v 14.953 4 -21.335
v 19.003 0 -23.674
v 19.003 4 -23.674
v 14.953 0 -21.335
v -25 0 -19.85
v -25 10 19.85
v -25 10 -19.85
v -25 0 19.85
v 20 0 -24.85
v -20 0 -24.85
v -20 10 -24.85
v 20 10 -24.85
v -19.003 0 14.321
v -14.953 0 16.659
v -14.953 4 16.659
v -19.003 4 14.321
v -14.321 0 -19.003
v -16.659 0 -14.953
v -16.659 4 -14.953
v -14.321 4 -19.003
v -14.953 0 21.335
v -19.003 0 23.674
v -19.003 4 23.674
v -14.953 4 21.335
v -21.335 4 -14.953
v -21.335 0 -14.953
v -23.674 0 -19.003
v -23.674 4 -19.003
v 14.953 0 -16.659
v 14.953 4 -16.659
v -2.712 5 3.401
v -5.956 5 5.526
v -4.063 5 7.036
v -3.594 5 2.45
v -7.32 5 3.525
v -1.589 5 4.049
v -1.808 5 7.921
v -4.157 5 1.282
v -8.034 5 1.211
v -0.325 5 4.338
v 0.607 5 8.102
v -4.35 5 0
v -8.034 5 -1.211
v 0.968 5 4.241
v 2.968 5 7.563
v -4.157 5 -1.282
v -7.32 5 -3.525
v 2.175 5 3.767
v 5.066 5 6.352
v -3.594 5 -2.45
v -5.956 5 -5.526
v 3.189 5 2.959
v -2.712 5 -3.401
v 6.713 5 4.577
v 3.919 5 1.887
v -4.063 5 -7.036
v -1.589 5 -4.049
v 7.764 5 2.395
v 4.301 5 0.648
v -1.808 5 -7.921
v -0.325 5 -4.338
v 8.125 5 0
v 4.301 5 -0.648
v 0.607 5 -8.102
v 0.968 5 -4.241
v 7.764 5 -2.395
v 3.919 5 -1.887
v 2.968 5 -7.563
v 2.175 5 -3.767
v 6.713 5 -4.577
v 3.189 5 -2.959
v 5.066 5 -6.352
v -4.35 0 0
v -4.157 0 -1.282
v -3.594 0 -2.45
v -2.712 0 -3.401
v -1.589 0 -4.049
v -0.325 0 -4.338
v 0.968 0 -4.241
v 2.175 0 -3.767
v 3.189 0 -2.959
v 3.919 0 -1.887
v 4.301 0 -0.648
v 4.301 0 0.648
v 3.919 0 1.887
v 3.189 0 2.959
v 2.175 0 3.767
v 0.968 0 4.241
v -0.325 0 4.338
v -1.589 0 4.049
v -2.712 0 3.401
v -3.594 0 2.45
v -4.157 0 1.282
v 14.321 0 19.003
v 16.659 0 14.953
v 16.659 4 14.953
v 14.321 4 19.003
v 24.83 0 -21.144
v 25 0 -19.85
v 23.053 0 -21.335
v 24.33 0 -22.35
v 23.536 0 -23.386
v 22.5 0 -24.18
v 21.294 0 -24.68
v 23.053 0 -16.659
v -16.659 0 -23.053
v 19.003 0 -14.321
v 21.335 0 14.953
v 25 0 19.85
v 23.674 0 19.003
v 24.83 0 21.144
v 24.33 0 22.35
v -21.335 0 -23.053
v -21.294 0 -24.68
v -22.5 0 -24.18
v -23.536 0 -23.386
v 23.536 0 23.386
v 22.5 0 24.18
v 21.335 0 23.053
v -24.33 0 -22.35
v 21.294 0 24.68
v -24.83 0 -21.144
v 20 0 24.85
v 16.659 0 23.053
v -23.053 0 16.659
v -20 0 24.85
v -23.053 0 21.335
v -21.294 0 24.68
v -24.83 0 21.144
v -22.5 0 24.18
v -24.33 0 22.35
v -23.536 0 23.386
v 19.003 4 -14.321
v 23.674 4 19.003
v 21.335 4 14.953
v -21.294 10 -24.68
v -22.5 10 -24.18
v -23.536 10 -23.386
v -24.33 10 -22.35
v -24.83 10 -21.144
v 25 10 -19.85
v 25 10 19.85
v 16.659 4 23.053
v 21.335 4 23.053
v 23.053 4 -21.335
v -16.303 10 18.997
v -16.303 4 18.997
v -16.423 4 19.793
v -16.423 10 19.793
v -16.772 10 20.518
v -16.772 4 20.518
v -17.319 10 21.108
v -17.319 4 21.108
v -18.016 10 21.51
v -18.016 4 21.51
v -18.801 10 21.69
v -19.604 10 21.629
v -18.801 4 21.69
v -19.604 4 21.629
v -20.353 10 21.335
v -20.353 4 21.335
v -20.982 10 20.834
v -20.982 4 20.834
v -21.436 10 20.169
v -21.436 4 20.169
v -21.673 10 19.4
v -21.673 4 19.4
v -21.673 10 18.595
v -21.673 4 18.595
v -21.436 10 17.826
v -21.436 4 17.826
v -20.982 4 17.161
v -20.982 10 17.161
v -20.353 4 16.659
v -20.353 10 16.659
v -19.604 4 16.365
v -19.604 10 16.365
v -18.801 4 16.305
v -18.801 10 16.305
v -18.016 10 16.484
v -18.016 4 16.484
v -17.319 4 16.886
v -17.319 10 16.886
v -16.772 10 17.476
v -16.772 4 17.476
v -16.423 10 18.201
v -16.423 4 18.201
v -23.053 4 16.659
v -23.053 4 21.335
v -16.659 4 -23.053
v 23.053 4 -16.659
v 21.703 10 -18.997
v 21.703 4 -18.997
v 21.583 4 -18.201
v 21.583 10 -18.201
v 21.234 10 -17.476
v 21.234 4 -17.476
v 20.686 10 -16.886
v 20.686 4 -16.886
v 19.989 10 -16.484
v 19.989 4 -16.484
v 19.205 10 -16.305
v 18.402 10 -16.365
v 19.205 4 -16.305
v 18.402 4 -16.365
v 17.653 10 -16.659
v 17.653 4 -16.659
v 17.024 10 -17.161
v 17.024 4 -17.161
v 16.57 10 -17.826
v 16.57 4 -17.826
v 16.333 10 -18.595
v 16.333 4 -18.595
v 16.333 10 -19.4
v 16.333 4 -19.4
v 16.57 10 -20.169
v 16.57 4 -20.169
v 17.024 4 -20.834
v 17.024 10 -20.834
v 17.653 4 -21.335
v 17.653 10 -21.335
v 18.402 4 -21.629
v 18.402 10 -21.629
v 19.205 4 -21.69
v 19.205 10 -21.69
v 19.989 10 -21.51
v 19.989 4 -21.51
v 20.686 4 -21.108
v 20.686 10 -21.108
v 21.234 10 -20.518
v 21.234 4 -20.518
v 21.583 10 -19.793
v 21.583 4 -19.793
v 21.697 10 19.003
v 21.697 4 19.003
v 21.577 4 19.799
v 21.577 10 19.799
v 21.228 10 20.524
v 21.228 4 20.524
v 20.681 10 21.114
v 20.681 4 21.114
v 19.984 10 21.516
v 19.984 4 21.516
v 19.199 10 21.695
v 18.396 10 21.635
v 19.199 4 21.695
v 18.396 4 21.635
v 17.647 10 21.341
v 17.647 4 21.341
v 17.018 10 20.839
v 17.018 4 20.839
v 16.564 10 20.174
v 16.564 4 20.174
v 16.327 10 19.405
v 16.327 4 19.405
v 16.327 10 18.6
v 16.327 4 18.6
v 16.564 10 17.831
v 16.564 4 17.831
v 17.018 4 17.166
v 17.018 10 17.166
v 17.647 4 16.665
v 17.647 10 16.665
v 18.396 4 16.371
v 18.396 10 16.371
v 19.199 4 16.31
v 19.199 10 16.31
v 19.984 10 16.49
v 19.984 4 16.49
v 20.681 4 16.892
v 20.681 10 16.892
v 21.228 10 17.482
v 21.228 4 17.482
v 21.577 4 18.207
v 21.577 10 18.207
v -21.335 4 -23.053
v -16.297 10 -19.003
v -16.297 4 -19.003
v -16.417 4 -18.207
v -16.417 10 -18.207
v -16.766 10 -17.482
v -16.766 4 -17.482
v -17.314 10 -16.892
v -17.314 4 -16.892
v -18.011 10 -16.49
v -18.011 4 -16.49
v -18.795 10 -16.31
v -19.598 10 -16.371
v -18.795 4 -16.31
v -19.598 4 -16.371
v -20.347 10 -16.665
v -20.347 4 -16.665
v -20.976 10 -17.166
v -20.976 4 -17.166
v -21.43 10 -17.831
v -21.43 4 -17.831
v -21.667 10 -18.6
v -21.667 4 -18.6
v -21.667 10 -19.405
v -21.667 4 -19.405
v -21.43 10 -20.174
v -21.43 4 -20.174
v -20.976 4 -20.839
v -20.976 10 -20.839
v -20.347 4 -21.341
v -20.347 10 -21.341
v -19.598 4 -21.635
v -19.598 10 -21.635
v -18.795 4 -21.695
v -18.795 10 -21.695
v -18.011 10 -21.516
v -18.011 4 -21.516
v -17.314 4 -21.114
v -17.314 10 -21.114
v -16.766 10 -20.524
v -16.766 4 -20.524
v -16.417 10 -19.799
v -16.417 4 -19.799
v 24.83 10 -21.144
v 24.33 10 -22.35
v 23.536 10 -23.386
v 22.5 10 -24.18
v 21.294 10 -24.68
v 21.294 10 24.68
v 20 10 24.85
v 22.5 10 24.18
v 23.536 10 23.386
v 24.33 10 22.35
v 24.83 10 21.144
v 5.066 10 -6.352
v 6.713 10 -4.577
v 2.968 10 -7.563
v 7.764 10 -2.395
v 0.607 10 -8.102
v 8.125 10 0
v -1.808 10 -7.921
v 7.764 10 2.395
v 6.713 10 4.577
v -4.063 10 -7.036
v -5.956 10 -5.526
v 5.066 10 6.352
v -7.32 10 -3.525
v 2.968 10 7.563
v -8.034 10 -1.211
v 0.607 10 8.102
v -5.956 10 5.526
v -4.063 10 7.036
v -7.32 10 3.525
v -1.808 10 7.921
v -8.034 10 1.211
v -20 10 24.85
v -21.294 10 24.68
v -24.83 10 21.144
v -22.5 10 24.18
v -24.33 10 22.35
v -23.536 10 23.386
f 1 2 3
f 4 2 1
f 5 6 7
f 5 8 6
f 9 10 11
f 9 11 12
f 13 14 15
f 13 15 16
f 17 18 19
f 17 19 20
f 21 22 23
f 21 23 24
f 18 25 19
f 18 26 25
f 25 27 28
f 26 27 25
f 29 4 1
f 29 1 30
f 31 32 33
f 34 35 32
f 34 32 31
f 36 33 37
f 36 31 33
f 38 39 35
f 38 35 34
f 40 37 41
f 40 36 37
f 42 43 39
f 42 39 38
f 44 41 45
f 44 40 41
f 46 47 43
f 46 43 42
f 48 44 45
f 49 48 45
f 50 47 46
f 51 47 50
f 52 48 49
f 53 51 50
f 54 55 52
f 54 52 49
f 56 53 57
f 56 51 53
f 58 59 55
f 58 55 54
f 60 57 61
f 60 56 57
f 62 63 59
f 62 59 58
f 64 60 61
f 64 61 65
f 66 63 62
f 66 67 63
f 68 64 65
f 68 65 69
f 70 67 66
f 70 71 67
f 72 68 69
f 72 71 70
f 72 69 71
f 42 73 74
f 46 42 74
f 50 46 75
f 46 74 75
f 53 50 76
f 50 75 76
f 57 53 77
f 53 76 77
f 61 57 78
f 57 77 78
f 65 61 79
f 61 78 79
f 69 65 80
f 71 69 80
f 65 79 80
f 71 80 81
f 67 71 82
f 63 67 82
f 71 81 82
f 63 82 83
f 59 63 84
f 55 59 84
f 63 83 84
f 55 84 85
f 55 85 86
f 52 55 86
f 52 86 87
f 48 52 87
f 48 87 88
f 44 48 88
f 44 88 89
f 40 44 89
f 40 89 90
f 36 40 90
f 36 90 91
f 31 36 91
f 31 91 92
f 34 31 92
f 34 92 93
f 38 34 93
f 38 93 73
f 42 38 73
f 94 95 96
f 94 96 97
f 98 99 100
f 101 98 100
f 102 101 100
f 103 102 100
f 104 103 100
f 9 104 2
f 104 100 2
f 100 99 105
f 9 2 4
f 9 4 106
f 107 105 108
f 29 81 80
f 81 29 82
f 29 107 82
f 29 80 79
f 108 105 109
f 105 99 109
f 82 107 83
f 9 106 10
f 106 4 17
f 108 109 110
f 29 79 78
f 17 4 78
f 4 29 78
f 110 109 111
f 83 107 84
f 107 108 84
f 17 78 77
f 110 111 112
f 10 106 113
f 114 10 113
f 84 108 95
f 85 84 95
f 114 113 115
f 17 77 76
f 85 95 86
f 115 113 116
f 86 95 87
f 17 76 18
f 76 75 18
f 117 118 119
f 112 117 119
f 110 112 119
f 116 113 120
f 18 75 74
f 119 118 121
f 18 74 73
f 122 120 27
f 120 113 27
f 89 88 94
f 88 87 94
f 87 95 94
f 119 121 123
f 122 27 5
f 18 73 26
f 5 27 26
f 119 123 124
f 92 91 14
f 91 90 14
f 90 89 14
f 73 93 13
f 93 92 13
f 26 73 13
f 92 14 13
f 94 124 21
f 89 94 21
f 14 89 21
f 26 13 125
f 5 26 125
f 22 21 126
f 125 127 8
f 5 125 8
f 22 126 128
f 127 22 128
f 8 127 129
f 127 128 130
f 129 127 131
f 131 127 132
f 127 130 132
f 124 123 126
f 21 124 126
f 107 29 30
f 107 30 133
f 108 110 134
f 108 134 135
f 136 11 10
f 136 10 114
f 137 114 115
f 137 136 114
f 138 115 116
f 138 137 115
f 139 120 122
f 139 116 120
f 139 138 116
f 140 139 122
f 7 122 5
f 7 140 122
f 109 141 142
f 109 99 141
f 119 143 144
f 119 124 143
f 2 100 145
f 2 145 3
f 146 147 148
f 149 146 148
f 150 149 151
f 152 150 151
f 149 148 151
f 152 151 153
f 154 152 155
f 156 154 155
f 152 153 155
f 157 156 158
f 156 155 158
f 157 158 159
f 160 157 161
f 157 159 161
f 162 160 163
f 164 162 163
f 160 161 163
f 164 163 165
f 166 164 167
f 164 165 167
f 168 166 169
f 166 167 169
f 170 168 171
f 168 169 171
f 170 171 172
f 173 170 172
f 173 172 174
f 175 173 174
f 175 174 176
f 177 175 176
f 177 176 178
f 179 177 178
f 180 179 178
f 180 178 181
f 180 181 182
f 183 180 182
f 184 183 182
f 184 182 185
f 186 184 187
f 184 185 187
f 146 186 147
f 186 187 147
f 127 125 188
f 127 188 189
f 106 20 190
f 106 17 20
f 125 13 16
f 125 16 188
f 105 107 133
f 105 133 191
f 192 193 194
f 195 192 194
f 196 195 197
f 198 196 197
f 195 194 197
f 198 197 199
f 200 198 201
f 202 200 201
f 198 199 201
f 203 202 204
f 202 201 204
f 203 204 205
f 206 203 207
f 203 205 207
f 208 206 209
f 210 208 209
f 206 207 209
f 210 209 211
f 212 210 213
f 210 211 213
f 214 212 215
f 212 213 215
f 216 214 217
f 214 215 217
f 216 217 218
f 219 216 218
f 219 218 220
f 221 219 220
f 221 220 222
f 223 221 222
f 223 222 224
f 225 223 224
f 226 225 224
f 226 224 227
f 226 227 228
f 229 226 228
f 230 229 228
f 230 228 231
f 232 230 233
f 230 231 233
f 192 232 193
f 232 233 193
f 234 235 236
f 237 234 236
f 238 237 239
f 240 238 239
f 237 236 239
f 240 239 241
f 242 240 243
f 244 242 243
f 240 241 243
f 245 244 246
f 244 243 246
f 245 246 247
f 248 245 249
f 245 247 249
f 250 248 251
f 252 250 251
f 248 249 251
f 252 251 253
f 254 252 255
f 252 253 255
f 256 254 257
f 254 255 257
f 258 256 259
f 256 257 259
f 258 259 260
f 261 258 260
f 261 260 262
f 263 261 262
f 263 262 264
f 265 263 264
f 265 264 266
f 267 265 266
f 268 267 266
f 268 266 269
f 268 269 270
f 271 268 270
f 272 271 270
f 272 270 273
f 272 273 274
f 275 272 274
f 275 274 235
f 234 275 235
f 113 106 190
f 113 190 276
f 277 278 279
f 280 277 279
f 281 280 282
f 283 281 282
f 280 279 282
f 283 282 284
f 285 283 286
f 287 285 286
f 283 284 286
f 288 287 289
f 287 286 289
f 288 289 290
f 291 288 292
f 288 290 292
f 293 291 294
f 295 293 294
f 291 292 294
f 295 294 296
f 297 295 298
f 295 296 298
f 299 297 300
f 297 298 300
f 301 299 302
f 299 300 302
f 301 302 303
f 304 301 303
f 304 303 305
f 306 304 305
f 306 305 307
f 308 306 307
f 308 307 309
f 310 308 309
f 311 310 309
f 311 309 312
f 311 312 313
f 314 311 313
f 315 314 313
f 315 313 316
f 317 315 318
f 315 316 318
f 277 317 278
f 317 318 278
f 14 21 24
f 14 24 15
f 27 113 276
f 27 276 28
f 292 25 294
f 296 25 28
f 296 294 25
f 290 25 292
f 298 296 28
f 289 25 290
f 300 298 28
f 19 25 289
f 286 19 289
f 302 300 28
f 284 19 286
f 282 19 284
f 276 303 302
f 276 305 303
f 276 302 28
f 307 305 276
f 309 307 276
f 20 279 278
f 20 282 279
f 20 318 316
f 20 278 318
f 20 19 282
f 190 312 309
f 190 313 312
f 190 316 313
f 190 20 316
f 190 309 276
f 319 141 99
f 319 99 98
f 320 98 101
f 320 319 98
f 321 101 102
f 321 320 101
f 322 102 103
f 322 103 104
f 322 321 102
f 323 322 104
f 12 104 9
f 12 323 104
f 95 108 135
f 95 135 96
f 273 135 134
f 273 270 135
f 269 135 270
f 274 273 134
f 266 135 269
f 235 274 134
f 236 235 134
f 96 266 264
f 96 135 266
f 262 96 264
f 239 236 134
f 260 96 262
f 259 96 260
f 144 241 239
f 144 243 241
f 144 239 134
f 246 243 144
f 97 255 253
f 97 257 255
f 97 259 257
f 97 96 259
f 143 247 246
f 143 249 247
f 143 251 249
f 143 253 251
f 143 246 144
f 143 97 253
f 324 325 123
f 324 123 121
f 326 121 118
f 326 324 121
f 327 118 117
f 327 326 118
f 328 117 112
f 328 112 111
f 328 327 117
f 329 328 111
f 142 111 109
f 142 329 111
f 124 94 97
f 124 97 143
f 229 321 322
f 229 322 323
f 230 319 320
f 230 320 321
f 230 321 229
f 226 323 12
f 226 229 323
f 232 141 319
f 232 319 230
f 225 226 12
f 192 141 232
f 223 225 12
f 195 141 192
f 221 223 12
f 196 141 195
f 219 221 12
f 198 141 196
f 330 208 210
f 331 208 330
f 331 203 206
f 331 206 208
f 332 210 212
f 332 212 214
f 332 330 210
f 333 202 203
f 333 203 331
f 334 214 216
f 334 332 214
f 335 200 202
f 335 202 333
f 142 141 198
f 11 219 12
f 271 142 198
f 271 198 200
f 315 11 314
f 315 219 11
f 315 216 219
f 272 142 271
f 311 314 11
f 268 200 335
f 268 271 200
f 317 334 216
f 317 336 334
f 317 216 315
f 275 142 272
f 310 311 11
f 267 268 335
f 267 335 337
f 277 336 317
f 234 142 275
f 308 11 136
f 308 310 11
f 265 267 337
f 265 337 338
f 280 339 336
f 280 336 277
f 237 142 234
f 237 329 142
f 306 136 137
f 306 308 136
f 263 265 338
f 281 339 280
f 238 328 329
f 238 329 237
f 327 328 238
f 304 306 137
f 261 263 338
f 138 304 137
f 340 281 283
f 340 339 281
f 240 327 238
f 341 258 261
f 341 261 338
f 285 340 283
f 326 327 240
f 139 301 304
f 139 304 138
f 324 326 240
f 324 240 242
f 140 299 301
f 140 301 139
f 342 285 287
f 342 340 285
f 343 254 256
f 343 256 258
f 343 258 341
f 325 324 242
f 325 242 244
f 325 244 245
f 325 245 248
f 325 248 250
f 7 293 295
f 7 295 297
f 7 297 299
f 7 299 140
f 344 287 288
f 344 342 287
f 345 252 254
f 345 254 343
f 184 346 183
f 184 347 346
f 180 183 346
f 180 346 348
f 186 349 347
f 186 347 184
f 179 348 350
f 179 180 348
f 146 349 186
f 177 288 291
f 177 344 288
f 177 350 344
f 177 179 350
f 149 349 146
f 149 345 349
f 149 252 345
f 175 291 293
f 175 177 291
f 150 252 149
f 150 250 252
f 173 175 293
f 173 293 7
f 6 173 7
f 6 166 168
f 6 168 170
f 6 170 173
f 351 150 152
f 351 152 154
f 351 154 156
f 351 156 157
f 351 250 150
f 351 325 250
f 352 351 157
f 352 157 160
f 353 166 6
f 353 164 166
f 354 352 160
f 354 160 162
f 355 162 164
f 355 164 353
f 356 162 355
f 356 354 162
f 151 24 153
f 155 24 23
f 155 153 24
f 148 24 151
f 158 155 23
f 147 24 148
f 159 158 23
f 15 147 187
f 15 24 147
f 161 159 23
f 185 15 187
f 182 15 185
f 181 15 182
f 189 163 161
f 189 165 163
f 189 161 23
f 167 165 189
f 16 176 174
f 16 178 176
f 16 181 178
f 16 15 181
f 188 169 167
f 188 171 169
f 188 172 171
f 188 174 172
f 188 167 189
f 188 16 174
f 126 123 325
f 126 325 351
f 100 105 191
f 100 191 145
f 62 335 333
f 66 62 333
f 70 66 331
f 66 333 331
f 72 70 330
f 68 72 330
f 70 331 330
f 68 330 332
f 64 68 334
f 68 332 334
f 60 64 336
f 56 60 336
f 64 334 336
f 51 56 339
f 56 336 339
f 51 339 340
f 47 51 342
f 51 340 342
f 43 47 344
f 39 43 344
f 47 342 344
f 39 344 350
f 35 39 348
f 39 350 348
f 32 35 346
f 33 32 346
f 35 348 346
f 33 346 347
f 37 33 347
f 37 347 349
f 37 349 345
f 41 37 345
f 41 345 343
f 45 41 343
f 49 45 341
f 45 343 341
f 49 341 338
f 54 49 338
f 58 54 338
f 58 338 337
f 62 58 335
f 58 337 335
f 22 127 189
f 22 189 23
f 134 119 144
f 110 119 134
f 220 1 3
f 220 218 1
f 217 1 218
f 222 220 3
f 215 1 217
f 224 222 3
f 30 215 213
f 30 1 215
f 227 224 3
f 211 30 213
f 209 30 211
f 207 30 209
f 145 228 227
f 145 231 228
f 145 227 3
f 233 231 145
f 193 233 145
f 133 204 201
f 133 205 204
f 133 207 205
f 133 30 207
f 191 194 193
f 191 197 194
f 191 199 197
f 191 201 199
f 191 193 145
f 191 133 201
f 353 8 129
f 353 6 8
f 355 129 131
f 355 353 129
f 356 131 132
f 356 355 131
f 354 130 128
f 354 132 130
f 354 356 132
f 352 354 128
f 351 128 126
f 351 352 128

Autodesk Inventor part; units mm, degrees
ref_plane "YZ Plane" through (0, 0, 0) normal (1, 0, 0) x (0, 1, 0)
ref_plane "XZ Plane" through (0, 0, 0) normal (0, 1, 0) x (-1, 0, 0)
ref_plane "XY Plane" through (0, 0, 0) normal (0, 0, 1) x (1, 0, 0)
sketch "Boceto1" plane through (0, 0, 0) normal (0, 1, 0) x (-1, 0, 0)
  line L0 (-25, 24.85) -> (25, 24.85)
  line L1 (25, 24.85) -> (25, -24.85)
  line L2 (25, -24.85) -> (-25, -24.85)
  line L3 (-25, -24.85) -> (-25, 24.85)
  line L4 (-25, 24.85) -> (25, -24.85) construction
  line L5 (25, 24.85) -> (-25, -24.85) construction
  circle A0 centre (0, 0) radius 4.35
  dimension "d0" = 50
  dimension "d1" = 8.7
  dimension "d2" = 49.7
extrude "Extrusión1" add sketch "Boceto1" along normal blind 10
sketch "Boceto4" plane through (0, 0, 0) normal (0, -1, 0) x (1, 0, 0)
  line L0 (25, 24.85) -> (25, -24.85) projected
  line L1 (-25, -24.85) -> (-25, 24.85) projected
  line L2 (25, 24.85) -> (-25, 24.85)
  line L3 (-25, 24.85) -> (-25, 17.85)
  line L4 (-25, 17.85) -> (25, 17.85)
  line L5 (25, 17.85) -> (25, 24.85)
  line L6 (25, -24.85) -> (-25, -24.85) projected
  line L7 (25, -24.85) -> (-25, -24.85)
  line L8 (-25, -24.85) -> (-25, -17.85)
  line L9 (-25, -17.85) -> (25, -17.85)
  line L10 (25, -17.85) -> (25, -24.85)
  line L11 (25, -24.85) -> (-25, -24.85) projected
  line L12 (25, 24.85) -> (25, -24.85) projected
  line L13 (-25, 24.85) -> (25, 24.85) projected
  line L14 (-25, -24.85) -> (-25, 24.85) projected
  circle A0 centre (0, 0) radius 4.35 projected
  point P0 (-25, -17.85)
  point P1 (25, -17.85)
  point P2 (-25, 24.85)
  dimension "d14" = 7
  dimension "d15" = 7
extrude "Extrusión4" [suppressed]
sketch "Boceto5" plane through (0, 0, 0) normal (0, 0, 1) x (1, 0, 0)
  circle A0 centre (18, -5.5) radius 2.7
  circle A1 centre (-18, -5.5) radius 2.7
  line L0 (20, -12) -> (-20, -12) projected
  line L1 (25, 0) -> (25, 10) projected
  line L2 (-25, 0) -> (-25, 10) projected
  point P0 (0, 0)
  point P1 (-25, 10)
  dimension "d19" = 6.5
  dimension "d20" = 5.4
  dimension "d21" = 7
  dimension "d22" = 7
extrude "Extrusión5" [suppressed]
sketch "Boceto6" plane through (0, 0, 0) normal (0, 0, 1) x (1, 0, 0)
  circle A0 centre (13, -5.5) radius 2.7 projected
  circle A1 centre (13, -5.5) radius 4.65
  circle A2 centre (-13, -5.5) radius 2.7 projected
  circle A3 centre (-13, -5.5) radius 4.65
  point P0 (0, 0)
  dimension "d25" = 9.3
extrude "Extrusión6" [suppressed]
fillet "Empalme2" [suppressed]
fillet "Empalme3" [suppressed]
sketch "Boceto8" plane through (0, 0, 0) normal (0, -1, 0) x (1, 0, 0)
  circle A0 centre (0, 0) radius 4.35 projected
  line L0 (-25, -24.85) -> (-25, 24.85) projected
  line L1 (25, 24.85) -> (25, -24.85) projected
  circle A1 centre (0, 0) radius 7.5
  line L2 (25, -24.85) -> (-25, -24.85) projected
  line L3 (-25, 24.85) -> (25, 24.85) projected
  dimension "d30" = 15
extrude "Extrusión7" [suppressed]
fillet "Empalme4" [suppressed]
sketch "Boceto9" plane through (0, 10, 0) normal (0, 1, 0) x (1, 0, 0)
  circle A0 centre (0, 0) radius 8.125
  dimension "d34" = 16.25
extrude "Extrusión8" cut sketch "Boceto9" against normal blind 5
sketch "Boceto10" plane through (0, 0, 0) normal (0, -1, 0) x (1, 0, 0)
  circle A0 centre (-18.9971, -19.0029) radius 2.7 projected
  circle A1 centre (-19.0029, 18.9971) radius 2.7 projected
  circle A2 centre (19.0029, -18.9971) radius 2.7 projected
  circle A3 centre (18.9971, 19.0029) radius 2.7 projected
  point P0 (0, 0)
extrude "Extrusión9" cut sketch "Boceto10" against normal through all
fillet "Empalme5" radius 5 4 edges at (-25, 5, 24.85) (25, 5, 24.85) (25, 5, -24.85) (-25, 5, -24.85)
sketch "Boceto11" plane through (0, 0, 0) normal (0, -1, 0) x (1, 0, 0)
  circle A0 centre (19.0029, -18.9971) radius 2.7 projected
  circle A1 centre (19.0029, -18.9971) radius 4.05
  line L0 (14.9529, -21.3354) -> (14.9529, -16.6588)
  line L1 (14.9529, -16.6588) -> (19.0029, -14.3206)
  line L2 (19.0029, -14.3206) -> (23.0529, -16.6588)
  line L3 (23.0529, -16.6588) -> (23.0529, -21.3354)
  line L4 (23.0529, -21.3354) -> (19.0029, -23.6737)
  line L5 (19.0029, -23.6737) -> (14.9529, -21.3354)
  point P0 (0, 0)
  dimension "d40" = 8.1
extrude "Extrusión10" cut sketch "Boceto11" against normal blind 4 contours A0 | A1 | L3 L4 A1 | A1 L2 L3 | A1 L1 L2 | L4 L5 A1 | A1 L0 L1 | L5 L0 A1
pattern_circular "Patrón circular1" count 4 over 360 about axis through (0, 0, 0) along (0, 1, 0) of "Extrusión10"
properties part number "Shoulderbottom"
